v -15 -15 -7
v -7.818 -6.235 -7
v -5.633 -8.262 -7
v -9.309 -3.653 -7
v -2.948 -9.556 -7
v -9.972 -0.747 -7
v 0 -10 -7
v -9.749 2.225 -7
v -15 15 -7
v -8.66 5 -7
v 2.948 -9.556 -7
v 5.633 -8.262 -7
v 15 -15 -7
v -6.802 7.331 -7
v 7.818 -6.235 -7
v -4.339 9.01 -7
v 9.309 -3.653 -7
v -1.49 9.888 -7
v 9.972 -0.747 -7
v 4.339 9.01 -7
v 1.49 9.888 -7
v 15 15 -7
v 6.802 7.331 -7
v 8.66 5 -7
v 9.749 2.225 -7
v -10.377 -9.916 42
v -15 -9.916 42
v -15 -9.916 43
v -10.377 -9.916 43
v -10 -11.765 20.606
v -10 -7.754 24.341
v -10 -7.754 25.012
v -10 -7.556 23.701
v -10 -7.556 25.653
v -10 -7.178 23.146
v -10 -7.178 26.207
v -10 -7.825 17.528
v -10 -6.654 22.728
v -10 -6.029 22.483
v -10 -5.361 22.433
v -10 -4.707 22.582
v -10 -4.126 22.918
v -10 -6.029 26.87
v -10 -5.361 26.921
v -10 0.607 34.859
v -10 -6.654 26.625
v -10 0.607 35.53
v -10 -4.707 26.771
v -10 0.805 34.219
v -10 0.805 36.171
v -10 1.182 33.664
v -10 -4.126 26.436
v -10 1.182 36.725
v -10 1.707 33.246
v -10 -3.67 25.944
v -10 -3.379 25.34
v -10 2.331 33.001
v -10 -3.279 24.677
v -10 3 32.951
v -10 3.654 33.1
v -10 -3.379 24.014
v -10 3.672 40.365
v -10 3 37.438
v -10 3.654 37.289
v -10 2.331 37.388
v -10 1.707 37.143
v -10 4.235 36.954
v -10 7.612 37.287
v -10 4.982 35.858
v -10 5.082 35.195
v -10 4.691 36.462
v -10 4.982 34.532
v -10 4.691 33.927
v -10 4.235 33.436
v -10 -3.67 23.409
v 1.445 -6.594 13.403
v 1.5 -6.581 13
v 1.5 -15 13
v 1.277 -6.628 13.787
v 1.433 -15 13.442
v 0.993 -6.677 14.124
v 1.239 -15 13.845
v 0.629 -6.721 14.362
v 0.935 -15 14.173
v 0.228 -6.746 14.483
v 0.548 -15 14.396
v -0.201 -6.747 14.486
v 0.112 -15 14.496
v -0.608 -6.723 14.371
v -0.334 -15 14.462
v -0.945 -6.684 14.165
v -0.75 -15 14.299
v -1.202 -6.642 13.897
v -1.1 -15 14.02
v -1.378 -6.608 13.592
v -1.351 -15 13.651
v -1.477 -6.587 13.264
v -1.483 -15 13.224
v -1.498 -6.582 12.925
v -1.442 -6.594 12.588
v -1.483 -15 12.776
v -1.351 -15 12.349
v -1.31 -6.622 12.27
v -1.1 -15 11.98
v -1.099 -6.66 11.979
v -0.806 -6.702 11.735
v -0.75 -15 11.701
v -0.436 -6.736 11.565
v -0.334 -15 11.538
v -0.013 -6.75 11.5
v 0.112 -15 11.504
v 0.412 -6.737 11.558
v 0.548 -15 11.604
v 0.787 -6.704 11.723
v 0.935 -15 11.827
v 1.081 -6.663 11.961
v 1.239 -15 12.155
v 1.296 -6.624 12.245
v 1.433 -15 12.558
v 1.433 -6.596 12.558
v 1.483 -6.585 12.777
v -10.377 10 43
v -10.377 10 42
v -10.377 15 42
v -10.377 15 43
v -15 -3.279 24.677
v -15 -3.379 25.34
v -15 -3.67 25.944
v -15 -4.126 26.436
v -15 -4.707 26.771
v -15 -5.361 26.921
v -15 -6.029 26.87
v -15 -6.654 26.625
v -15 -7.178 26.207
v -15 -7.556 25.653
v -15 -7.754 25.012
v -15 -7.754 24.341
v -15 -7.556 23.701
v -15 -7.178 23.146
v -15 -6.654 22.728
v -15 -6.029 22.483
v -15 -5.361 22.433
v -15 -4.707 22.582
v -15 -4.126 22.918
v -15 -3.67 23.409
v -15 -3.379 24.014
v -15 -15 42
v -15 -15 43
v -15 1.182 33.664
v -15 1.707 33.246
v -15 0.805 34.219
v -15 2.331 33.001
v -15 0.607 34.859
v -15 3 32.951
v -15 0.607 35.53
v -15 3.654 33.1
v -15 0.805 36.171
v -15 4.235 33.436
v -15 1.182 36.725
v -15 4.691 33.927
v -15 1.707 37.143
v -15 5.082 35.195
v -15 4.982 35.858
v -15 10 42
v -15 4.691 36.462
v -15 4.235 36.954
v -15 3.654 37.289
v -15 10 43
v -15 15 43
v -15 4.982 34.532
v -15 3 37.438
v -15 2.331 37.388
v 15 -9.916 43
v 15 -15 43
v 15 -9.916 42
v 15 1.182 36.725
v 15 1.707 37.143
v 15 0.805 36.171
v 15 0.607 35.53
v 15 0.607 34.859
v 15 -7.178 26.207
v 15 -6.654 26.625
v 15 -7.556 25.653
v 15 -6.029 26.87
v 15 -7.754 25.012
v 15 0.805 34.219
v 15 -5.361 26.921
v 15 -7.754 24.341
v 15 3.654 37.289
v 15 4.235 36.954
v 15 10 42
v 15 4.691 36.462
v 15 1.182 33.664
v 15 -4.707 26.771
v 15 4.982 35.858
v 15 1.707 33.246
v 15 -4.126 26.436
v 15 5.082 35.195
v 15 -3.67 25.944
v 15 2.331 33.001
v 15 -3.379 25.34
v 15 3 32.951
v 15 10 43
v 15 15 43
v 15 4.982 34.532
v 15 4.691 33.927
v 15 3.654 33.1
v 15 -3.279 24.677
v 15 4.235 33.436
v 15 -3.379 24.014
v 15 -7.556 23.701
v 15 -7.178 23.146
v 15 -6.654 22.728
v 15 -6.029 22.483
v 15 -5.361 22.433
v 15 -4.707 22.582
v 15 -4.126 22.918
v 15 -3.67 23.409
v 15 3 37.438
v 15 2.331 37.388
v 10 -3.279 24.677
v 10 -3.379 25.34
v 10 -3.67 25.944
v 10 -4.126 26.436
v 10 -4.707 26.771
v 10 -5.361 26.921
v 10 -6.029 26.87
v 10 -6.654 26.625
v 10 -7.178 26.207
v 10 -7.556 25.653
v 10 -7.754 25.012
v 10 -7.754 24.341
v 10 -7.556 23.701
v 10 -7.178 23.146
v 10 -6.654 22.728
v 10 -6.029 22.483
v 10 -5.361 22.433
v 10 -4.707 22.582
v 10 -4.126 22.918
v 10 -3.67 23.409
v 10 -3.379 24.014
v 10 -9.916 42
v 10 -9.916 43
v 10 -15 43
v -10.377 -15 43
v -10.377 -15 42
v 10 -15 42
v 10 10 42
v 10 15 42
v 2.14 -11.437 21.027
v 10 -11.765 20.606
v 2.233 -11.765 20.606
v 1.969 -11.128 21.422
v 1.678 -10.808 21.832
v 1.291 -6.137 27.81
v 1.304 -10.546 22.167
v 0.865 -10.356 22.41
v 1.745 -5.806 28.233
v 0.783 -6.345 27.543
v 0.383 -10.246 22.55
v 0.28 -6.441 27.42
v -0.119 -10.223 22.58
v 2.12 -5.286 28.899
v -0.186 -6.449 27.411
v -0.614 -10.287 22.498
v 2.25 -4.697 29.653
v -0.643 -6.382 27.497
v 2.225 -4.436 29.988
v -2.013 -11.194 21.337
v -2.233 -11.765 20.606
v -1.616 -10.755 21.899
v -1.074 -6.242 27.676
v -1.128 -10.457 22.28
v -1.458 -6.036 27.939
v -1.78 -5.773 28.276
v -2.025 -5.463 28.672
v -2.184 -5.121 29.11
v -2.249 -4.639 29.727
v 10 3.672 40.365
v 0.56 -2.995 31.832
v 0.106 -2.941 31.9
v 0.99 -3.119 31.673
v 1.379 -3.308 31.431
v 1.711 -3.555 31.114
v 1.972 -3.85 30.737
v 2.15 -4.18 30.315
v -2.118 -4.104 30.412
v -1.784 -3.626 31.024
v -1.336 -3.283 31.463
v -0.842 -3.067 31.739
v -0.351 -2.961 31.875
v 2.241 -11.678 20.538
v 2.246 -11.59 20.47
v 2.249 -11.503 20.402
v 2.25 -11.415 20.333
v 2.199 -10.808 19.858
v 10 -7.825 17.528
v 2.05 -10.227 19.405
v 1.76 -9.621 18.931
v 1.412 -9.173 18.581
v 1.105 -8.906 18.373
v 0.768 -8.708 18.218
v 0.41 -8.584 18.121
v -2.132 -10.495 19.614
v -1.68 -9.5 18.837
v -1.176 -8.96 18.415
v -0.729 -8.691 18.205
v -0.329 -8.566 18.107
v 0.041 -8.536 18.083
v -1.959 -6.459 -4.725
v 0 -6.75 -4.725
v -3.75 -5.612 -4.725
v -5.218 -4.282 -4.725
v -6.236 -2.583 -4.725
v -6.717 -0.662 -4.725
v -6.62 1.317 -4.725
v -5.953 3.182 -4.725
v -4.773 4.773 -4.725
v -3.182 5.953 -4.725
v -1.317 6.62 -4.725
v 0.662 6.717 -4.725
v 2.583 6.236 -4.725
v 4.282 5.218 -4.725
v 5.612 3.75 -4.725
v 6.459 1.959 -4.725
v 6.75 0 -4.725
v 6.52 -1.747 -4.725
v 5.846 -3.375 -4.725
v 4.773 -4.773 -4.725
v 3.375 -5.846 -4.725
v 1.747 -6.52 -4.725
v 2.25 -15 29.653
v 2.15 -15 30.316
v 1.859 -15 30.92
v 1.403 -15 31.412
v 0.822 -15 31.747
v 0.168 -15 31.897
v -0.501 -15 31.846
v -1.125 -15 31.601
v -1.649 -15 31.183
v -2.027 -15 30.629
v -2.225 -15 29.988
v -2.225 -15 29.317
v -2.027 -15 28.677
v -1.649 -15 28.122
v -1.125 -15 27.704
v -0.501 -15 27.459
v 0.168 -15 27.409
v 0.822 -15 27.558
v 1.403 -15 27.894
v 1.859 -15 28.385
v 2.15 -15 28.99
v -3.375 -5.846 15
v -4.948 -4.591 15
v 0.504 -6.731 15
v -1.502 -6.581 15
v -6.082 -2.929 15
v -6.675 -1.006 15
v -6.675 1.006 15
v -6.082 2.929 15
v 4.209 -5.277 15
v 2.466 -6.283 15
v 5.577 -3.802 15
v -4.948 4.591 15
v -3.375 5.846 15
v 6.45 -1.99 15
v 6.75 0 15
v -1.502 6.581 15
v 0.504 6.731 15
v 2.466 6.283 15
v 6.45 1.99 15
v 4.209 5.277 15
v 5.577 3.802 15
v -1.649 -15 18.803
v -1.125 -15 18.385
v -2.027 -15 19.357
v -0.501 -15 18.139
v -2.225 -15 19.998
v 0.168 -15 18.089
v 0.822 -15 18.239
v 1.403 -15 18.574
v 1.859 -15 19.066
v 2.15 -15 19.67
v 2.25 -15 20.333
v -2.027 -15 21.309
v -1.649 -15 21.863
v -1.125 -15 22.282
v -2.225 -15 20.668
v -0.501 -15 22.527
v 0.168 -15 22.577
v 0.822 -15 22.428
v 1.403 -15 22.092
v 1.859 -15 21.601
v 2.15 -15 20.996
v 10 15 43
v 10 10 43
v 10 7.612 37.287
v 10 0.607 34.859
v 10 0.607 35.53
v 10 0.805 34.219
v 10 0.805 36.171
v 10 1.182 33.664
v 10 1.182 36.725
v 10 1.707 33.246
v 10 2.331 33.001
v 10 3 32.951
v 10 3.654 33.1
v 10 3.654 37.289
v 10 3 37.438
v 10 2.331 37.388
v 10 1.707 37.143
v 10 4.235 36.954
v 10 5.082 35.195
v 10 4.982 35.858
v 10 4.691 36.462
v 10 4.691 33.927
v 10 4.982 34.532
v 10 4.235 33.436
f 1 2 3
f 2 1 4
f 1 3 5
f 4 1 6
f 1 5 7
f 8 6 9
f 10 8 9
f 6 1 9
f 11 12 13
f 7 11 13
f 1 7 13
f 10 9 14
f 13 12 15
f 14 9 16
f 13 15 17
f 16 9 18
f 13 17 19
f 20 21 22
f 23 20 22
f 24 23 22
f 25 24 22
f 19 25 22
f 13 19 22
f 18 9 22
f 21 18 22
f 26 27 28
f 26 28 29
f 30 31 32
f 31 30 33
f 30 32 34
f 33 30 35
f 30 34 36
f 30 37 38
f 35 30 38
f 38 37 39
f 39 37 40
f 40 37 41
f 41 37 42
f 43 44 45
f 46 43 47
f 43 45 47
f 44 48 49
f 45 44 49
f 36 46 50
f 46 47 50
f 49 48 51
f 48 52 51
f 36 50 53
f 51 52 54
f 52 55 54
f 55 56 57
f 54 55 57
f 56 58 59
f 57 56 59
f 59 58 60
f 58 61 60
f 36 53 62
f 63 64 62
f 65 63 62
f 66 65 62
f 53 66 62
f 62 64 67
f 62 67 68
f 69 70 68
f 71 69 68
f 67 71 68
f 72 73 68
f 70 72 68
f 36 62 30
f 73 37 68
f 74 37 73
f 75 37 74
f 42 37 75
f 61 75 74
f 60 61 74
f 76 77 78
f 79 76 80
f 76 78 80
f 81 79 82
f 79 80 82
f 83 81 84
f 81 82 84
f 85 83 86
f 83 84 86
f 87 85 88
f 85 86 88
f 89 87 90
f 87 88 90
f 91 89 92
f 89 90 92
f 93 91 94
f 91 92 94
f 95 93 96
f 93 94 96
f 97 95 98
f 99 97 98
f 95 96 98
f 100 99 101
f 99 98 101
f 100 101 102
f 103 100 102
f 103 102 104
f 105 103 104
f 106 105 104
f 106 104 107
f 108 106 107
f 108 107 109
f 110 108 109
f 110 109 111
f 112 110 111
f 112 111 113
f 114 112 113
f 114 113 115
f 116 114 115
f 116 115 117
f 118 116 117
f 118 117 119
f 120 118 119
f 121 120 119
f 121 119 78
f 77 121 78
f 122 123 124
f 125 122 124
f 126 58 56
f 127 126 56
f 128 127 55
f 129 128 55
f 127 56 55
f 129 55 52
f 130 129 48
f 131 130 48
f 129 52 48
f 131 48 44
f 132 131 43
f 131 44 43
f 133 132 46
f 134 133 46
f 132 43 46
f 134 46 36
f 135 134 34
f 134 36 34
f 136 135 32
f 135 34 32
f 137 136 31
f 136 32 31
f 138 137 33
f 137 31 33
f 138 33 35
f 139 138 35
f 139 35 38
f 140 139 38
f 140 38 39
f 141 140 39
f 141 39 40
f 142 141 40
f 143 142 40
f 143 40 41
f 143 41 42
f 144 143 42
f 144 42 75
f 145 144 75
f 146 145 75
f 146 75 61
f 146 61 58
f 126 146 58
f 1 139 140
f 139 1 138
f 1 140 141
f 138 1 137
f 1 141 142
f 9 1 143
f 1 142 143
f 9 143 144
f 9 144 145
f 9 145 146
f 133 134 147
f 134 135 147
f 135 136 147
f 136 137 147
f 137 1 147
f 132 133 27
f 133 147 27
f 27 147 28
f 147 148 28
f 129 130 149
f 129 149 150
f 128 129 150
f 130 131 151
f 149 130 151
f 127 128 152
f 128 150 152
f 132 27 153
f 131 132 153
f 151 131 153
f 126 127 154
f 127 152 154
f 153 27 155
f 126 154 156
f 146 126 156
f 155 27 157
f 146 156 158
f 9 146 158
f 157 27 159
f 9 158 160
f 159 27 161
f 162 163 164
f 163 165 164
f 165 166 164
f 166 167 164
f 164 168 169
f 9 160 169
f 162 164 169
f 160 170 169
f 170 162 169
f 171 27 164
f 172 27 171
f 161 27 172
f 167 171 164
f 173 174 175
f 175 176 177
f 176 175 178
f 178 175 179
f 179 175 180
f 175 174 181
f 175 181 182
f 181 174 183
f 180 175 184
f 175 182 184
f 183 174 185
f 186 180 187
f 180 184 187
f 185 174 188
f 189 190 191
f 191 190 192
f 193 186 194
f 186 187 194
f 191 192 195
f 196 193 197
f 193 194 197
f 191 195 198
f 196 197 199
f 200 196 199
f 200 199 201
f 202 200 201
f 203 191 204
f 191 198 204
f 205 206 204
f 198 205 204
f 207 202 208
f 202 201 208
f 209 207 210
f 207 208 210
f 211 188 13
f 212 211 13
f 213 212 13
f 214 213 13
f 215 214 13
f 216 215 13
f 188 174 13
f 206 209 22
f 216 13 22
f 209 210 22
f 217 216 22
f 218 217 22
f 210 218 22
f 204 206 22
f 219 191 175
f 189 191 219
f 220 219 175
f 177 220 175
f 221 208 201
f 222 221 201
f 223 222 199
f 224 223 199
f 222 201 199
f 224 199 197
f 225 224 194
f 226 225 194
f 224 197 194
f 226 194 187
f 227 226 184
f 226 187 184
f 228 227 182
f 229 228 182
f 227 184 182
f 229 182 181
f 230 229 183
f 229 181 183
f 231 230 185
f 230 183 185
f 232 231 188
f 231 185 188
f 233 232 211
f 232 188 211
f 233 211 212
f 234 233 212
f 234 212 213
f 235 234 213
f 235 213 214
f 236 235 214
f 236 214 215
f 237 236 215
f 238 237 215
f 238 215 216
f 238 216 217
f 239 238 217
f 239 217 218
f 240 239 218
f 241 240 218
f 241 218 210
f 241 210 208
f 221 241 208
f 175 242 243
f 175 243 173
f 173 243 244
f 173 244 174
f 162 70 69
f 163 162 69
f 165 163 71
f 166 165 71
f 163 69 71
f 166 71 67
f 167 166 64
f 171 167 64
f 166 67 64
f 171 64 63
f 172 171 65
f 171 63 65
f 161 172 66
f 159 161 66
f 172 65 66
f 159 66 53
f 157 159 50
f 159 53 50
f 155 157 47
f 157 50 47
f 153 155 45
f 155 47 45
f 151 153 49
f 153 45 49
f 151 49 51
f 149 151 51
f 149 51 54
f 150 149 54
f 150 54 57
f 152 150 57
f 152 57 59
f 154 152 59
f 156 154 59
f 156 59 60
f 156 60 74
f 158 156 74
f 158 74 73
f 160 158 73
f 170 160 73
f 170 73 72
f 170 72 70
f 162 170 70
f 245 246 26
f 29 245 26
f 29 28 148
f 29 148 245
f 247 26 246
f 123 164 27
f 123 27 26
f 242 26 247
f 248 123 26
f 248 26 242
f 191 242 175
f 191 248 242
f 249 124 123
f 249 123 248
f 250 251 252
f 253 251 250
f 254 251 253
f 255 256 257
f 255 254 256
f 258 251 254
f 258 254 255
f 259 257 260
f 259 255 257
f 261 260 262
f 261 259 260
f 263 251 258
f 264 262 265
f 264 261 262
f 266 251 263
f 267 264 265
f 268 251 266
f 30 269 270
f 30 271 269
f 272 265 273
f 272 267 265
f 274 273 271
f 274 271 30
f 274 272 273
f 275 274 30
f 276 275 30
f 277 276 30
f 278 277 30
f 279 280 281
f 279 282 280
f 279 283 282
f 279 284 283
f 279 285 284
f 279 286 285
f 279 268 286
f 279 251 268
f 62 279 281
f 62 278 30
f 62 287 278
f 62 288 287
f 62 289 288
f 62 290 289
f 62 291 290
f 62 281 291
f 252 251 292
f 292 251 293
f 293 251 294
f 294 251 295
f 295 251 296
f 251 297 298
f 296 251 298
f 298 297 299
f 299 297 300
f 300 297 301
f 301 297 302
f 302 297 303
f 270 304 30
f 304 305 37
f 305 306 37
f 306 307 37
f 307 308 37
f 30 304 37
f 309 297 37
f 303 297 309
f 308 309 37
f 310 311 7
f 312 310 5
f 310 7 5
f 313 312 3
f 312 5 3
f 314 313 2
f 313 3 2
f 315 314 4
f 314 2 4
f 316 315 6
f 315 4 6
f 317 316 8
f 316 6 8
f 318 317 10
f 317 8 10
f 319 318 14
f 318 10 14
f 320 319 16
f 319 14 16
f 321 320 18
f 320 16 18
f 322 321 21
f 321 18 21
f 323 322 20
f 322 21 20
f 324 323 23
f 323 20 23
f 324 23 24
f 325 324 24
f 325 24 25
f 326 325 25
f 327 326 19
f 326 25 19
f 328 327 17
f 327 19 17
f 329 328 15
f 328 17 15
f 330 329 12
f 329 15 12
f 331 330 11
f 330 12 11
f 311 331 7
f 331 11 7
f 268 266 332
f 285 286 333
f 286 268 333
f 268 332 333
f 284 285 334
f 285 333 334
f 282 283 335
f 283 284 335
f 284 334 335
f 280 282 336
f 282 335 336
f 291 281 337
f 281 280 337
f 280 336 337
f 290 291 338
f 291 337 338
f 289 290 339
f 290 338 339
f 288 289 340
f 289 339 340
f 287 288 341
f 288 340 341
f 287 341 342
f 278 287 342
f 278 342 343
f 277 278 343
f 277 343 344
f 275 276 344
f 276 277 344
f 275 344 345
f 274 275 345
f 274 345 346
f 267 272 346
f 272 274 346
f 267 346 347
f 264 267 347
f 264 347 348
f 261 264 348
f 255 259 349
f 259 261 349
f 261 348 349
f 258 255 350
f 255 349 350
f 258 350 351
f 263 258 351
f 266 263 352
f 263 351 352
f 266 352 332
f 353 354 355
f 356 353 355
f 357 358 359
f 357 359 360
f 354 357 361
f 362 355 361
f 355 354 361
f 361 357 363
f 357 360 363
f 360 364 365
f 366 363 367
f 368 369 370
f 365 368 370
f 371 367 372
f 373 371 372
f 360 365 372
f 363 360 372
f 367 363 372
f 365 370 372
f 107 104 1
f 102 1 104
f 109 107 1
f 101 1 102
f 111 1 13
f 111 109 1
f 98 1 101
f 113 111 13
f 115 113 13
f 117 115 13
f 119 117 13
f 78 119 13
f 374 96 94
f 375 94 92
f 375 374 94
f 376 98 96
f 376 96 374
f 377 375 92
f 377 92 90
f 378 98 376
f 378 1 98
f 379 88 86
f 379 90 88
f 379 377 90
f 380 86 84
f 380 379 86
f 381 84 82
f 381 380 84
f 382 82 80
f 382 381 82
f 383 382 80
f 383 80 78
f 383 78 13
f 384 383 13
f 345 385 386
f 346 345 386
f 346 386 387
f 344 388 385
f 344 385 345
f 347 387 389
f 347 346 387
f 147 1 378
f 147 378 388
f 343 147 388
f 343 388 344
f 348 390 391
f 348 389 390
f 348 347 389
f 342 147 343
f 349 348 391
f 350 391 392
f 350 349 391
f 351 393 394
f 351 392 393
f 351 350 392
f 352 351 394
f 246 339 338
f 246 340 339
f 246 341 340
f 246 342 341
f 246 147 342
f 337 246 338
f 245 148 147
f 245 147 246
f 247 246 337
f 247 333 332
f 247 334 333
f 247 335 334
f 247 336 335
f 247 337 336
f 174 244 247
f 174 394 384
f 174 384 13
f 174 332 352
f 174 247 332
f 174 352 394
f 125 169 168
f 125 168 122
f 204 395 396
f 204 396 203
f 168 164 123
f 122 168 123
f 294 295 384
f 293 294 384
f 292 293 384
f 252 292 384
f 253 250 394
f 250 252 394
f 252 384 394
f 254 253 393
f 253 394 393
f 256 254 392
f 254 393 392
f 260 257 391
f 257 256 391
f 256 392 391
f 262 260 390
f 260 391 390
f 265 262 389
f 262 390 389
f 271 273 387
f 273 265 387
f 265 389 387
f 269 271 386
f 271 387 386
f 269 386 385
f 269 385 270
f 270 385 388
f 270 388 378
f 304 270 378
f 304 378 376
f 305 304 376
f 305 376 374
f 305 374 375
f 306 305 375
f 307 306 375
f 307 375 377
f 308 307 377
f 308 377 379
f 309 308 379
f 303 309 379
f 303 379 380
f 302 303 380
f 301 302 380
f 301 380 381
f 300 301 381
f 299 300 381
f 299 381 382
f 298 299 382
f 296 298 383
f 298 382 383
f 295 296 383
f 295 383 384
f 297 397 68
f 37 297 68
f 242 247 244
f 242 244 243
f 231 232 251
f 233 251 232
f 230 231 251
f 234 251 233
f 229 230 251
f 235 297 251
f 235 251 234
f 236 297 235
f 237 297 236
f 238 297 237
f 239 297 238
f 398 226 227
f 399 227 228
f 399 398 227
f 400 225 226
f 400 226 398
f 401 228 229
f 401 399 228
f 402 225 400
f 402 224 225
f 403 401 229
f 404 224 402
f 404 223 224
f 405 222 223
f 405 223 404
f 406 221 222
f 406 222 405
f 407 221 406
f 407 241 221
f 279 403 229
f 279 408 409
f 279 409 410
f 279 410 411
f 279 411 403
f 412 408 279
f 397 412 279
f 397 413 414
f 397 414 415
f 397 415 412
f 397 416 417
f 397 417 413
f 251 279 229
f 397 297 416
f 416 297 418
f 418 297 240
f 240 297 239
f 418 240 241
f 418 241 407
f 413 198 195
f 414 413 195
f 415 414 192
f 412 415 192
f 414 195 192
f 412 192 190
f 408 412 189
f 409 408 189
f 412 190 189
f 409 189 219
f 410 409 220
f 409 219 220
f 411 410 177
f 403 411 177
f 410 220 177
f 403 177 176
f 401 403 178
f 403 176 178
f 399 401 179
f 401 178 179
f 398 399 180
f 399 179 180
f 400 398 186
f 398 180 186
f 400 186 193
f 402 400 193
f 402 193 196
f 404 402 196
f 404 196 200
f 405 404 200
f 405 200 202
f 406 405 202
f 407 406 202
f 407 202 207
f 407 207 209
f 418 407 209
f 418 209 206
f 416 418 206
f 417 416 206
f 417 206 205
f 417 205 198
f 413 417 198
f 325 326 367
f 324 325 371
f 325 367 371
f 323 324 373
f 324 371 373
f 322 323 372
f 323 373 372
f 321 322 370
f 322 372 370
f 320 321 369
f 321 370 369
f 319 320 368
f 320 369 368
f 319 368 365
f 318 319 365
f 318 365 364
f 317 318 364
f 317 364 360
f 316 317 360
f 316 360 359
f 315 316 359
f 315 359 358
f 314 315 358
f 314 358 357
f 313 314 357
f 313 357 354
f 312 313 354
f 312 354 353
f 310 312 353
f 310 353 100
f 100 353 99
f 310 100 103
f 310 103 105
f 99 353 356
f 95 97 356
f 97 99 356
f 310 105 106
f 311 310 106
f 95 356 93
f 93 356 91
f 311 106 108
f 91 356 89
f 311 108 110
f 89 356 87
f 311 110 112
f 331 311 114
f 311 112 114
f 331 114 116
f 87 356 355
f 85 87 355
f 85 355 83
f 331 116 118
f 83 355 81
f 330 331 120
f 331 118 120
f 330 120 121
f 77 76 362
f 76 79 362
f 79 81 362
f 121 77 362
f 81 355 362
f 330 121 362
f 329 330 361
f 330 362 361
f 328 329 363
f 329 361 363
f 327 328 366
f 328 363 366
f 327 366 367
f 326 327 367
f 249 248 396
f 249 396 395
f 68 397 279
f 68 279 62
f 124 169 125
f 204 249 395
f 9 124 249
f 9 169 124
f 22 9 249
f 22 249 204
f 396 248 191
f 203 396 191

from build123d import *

# Parameters (mm, degrees)
F0_W          = 30
F0_H          = 30
F1_DEPTH      = 42
F1_DEPTH_BACK = 7
F2_R          = 6.75
F3_DEPTH      = 15
F3_DEPTH_BACK = 7
F6_W          = 20
F6_H          = 25.0738771936
F7_DEPTH      = 5
F9_R          = 2.25
F10_DEPTH     = 50
F12_R         = 2.25
F13_DEPTH     = 7
F14_R         = 2.25
F15_DEPTH     = 14
F16_W         = 5
F16_H         = 5
F16_H_2       = 5.0838639587
F16_W_2       = 4.6232988685
F17_DEPTH     = 1
F18_R         = 1.5
F19_DEPTH     = 8.4197768095


with BuildPart() as f1:
    # F0 (on Top) → F1 (new body, two sides)
    with BuildSketch(Plane.XY) as f1_sk:
        Rectangle(F0_W, F0_H)
    extrude(amount=F1_DEPTH)
    extrude(f1_sk.sketch, amount=-F1_DEPTH_BACK)

    # F2 (on Top) → F3 (cut, two sides)
    with BuildSketch(Plane.XY) as f3_sk:
        Circle(F2_R)
    extrude(amount=F3_DEPTH, mode=Mode.SUBTRACT)
    extrude(f3_sk.sketch, amount=-F3_DEPTH_BACK, mode=Mode.SUBTRACT)

    # F6 (on face) → F7 (cut)
    with BuildSketch(Plane(origin=(0, -13.3626828422, 10.4400720362), x_dir=(-1, 0, 0), z_dir=(0, 0.7880107536, -0.6156614753))):
        with Locations((0, 21.5316948633)):
            Rectangle(F6_W, F6_H)
    extrude(amount=-F7_DEPTH, mode=Mode.SUBTRACT)

    # F9 (on offset) → F10 (cut)
    with BuildSketch(Plane.YZ.offset(15)):
        with Locations((-5.5286819115, 24.6767979115)):
            Circle(F9_R)
        with Locations((2.8317631222, 35.1947769523)):
            Circle(F9_R)
    extrude(amount=-F10_DEPTH, mode=Mode.SUBTRACT)

    # F12 (on offset) → F13 (cut)
    with BuildSketch(Plane.XZ.offset(15)):
        with Locations((0, 20.3330869851)):
            Circle(F12_R)
    extrude(amount=-F13_DEPTH, mode=Mode.SUBTRACT)

    # F14 (on offset) → F15 (cut)
    with BuildSketch(Plane.XZ.offset(15)):
        with Locations((0, 29.6528354788)):
            Circle(F14_R)
    extrude(amount=-F15_DEPTH, mode=Mode.SUBTRACT)

    # F16 (on face) → F17 (join)
    with BuildSketch(Plane.XY.offset(42)):
        with Locations((12.5, 12.5)):
            Rectangle(F16_W, F16_H)
        with Locations((12.5, -12.4580680206)):
            Rectangle(F16_W, F16_H_2)
        with Locations((-12.6883505657, -12.4580680206)):
            Rectangle(F16_W_2, F16_H_2)
        with Locations((-12.6883505657, 12.5)):
            Rectangle(F16_W_2, F16_H)
    extrude(amount=F17_DEPTH)

    # F18 (on face) → F19 (cut, through all)
    with BuildSketch(Plane.XZ.offset(15)):
        with Locations((0, 13)):
            Circle(F18_R)
    extrude(amount=-F19_DEPTH, mode=Mode.SUBTRACT)

    # F20 (on Right) → F21 (revolve, cut)
    with BuildSketch(Plane.YZ):
        Polygon((0, -7), (0, 0), (-10, -7), align=None)
    revolve(axis=Axis((0, 0, -3.5), (0, 0, -1)), mode=Mode.SUBTRACT)


solid = f1.part
